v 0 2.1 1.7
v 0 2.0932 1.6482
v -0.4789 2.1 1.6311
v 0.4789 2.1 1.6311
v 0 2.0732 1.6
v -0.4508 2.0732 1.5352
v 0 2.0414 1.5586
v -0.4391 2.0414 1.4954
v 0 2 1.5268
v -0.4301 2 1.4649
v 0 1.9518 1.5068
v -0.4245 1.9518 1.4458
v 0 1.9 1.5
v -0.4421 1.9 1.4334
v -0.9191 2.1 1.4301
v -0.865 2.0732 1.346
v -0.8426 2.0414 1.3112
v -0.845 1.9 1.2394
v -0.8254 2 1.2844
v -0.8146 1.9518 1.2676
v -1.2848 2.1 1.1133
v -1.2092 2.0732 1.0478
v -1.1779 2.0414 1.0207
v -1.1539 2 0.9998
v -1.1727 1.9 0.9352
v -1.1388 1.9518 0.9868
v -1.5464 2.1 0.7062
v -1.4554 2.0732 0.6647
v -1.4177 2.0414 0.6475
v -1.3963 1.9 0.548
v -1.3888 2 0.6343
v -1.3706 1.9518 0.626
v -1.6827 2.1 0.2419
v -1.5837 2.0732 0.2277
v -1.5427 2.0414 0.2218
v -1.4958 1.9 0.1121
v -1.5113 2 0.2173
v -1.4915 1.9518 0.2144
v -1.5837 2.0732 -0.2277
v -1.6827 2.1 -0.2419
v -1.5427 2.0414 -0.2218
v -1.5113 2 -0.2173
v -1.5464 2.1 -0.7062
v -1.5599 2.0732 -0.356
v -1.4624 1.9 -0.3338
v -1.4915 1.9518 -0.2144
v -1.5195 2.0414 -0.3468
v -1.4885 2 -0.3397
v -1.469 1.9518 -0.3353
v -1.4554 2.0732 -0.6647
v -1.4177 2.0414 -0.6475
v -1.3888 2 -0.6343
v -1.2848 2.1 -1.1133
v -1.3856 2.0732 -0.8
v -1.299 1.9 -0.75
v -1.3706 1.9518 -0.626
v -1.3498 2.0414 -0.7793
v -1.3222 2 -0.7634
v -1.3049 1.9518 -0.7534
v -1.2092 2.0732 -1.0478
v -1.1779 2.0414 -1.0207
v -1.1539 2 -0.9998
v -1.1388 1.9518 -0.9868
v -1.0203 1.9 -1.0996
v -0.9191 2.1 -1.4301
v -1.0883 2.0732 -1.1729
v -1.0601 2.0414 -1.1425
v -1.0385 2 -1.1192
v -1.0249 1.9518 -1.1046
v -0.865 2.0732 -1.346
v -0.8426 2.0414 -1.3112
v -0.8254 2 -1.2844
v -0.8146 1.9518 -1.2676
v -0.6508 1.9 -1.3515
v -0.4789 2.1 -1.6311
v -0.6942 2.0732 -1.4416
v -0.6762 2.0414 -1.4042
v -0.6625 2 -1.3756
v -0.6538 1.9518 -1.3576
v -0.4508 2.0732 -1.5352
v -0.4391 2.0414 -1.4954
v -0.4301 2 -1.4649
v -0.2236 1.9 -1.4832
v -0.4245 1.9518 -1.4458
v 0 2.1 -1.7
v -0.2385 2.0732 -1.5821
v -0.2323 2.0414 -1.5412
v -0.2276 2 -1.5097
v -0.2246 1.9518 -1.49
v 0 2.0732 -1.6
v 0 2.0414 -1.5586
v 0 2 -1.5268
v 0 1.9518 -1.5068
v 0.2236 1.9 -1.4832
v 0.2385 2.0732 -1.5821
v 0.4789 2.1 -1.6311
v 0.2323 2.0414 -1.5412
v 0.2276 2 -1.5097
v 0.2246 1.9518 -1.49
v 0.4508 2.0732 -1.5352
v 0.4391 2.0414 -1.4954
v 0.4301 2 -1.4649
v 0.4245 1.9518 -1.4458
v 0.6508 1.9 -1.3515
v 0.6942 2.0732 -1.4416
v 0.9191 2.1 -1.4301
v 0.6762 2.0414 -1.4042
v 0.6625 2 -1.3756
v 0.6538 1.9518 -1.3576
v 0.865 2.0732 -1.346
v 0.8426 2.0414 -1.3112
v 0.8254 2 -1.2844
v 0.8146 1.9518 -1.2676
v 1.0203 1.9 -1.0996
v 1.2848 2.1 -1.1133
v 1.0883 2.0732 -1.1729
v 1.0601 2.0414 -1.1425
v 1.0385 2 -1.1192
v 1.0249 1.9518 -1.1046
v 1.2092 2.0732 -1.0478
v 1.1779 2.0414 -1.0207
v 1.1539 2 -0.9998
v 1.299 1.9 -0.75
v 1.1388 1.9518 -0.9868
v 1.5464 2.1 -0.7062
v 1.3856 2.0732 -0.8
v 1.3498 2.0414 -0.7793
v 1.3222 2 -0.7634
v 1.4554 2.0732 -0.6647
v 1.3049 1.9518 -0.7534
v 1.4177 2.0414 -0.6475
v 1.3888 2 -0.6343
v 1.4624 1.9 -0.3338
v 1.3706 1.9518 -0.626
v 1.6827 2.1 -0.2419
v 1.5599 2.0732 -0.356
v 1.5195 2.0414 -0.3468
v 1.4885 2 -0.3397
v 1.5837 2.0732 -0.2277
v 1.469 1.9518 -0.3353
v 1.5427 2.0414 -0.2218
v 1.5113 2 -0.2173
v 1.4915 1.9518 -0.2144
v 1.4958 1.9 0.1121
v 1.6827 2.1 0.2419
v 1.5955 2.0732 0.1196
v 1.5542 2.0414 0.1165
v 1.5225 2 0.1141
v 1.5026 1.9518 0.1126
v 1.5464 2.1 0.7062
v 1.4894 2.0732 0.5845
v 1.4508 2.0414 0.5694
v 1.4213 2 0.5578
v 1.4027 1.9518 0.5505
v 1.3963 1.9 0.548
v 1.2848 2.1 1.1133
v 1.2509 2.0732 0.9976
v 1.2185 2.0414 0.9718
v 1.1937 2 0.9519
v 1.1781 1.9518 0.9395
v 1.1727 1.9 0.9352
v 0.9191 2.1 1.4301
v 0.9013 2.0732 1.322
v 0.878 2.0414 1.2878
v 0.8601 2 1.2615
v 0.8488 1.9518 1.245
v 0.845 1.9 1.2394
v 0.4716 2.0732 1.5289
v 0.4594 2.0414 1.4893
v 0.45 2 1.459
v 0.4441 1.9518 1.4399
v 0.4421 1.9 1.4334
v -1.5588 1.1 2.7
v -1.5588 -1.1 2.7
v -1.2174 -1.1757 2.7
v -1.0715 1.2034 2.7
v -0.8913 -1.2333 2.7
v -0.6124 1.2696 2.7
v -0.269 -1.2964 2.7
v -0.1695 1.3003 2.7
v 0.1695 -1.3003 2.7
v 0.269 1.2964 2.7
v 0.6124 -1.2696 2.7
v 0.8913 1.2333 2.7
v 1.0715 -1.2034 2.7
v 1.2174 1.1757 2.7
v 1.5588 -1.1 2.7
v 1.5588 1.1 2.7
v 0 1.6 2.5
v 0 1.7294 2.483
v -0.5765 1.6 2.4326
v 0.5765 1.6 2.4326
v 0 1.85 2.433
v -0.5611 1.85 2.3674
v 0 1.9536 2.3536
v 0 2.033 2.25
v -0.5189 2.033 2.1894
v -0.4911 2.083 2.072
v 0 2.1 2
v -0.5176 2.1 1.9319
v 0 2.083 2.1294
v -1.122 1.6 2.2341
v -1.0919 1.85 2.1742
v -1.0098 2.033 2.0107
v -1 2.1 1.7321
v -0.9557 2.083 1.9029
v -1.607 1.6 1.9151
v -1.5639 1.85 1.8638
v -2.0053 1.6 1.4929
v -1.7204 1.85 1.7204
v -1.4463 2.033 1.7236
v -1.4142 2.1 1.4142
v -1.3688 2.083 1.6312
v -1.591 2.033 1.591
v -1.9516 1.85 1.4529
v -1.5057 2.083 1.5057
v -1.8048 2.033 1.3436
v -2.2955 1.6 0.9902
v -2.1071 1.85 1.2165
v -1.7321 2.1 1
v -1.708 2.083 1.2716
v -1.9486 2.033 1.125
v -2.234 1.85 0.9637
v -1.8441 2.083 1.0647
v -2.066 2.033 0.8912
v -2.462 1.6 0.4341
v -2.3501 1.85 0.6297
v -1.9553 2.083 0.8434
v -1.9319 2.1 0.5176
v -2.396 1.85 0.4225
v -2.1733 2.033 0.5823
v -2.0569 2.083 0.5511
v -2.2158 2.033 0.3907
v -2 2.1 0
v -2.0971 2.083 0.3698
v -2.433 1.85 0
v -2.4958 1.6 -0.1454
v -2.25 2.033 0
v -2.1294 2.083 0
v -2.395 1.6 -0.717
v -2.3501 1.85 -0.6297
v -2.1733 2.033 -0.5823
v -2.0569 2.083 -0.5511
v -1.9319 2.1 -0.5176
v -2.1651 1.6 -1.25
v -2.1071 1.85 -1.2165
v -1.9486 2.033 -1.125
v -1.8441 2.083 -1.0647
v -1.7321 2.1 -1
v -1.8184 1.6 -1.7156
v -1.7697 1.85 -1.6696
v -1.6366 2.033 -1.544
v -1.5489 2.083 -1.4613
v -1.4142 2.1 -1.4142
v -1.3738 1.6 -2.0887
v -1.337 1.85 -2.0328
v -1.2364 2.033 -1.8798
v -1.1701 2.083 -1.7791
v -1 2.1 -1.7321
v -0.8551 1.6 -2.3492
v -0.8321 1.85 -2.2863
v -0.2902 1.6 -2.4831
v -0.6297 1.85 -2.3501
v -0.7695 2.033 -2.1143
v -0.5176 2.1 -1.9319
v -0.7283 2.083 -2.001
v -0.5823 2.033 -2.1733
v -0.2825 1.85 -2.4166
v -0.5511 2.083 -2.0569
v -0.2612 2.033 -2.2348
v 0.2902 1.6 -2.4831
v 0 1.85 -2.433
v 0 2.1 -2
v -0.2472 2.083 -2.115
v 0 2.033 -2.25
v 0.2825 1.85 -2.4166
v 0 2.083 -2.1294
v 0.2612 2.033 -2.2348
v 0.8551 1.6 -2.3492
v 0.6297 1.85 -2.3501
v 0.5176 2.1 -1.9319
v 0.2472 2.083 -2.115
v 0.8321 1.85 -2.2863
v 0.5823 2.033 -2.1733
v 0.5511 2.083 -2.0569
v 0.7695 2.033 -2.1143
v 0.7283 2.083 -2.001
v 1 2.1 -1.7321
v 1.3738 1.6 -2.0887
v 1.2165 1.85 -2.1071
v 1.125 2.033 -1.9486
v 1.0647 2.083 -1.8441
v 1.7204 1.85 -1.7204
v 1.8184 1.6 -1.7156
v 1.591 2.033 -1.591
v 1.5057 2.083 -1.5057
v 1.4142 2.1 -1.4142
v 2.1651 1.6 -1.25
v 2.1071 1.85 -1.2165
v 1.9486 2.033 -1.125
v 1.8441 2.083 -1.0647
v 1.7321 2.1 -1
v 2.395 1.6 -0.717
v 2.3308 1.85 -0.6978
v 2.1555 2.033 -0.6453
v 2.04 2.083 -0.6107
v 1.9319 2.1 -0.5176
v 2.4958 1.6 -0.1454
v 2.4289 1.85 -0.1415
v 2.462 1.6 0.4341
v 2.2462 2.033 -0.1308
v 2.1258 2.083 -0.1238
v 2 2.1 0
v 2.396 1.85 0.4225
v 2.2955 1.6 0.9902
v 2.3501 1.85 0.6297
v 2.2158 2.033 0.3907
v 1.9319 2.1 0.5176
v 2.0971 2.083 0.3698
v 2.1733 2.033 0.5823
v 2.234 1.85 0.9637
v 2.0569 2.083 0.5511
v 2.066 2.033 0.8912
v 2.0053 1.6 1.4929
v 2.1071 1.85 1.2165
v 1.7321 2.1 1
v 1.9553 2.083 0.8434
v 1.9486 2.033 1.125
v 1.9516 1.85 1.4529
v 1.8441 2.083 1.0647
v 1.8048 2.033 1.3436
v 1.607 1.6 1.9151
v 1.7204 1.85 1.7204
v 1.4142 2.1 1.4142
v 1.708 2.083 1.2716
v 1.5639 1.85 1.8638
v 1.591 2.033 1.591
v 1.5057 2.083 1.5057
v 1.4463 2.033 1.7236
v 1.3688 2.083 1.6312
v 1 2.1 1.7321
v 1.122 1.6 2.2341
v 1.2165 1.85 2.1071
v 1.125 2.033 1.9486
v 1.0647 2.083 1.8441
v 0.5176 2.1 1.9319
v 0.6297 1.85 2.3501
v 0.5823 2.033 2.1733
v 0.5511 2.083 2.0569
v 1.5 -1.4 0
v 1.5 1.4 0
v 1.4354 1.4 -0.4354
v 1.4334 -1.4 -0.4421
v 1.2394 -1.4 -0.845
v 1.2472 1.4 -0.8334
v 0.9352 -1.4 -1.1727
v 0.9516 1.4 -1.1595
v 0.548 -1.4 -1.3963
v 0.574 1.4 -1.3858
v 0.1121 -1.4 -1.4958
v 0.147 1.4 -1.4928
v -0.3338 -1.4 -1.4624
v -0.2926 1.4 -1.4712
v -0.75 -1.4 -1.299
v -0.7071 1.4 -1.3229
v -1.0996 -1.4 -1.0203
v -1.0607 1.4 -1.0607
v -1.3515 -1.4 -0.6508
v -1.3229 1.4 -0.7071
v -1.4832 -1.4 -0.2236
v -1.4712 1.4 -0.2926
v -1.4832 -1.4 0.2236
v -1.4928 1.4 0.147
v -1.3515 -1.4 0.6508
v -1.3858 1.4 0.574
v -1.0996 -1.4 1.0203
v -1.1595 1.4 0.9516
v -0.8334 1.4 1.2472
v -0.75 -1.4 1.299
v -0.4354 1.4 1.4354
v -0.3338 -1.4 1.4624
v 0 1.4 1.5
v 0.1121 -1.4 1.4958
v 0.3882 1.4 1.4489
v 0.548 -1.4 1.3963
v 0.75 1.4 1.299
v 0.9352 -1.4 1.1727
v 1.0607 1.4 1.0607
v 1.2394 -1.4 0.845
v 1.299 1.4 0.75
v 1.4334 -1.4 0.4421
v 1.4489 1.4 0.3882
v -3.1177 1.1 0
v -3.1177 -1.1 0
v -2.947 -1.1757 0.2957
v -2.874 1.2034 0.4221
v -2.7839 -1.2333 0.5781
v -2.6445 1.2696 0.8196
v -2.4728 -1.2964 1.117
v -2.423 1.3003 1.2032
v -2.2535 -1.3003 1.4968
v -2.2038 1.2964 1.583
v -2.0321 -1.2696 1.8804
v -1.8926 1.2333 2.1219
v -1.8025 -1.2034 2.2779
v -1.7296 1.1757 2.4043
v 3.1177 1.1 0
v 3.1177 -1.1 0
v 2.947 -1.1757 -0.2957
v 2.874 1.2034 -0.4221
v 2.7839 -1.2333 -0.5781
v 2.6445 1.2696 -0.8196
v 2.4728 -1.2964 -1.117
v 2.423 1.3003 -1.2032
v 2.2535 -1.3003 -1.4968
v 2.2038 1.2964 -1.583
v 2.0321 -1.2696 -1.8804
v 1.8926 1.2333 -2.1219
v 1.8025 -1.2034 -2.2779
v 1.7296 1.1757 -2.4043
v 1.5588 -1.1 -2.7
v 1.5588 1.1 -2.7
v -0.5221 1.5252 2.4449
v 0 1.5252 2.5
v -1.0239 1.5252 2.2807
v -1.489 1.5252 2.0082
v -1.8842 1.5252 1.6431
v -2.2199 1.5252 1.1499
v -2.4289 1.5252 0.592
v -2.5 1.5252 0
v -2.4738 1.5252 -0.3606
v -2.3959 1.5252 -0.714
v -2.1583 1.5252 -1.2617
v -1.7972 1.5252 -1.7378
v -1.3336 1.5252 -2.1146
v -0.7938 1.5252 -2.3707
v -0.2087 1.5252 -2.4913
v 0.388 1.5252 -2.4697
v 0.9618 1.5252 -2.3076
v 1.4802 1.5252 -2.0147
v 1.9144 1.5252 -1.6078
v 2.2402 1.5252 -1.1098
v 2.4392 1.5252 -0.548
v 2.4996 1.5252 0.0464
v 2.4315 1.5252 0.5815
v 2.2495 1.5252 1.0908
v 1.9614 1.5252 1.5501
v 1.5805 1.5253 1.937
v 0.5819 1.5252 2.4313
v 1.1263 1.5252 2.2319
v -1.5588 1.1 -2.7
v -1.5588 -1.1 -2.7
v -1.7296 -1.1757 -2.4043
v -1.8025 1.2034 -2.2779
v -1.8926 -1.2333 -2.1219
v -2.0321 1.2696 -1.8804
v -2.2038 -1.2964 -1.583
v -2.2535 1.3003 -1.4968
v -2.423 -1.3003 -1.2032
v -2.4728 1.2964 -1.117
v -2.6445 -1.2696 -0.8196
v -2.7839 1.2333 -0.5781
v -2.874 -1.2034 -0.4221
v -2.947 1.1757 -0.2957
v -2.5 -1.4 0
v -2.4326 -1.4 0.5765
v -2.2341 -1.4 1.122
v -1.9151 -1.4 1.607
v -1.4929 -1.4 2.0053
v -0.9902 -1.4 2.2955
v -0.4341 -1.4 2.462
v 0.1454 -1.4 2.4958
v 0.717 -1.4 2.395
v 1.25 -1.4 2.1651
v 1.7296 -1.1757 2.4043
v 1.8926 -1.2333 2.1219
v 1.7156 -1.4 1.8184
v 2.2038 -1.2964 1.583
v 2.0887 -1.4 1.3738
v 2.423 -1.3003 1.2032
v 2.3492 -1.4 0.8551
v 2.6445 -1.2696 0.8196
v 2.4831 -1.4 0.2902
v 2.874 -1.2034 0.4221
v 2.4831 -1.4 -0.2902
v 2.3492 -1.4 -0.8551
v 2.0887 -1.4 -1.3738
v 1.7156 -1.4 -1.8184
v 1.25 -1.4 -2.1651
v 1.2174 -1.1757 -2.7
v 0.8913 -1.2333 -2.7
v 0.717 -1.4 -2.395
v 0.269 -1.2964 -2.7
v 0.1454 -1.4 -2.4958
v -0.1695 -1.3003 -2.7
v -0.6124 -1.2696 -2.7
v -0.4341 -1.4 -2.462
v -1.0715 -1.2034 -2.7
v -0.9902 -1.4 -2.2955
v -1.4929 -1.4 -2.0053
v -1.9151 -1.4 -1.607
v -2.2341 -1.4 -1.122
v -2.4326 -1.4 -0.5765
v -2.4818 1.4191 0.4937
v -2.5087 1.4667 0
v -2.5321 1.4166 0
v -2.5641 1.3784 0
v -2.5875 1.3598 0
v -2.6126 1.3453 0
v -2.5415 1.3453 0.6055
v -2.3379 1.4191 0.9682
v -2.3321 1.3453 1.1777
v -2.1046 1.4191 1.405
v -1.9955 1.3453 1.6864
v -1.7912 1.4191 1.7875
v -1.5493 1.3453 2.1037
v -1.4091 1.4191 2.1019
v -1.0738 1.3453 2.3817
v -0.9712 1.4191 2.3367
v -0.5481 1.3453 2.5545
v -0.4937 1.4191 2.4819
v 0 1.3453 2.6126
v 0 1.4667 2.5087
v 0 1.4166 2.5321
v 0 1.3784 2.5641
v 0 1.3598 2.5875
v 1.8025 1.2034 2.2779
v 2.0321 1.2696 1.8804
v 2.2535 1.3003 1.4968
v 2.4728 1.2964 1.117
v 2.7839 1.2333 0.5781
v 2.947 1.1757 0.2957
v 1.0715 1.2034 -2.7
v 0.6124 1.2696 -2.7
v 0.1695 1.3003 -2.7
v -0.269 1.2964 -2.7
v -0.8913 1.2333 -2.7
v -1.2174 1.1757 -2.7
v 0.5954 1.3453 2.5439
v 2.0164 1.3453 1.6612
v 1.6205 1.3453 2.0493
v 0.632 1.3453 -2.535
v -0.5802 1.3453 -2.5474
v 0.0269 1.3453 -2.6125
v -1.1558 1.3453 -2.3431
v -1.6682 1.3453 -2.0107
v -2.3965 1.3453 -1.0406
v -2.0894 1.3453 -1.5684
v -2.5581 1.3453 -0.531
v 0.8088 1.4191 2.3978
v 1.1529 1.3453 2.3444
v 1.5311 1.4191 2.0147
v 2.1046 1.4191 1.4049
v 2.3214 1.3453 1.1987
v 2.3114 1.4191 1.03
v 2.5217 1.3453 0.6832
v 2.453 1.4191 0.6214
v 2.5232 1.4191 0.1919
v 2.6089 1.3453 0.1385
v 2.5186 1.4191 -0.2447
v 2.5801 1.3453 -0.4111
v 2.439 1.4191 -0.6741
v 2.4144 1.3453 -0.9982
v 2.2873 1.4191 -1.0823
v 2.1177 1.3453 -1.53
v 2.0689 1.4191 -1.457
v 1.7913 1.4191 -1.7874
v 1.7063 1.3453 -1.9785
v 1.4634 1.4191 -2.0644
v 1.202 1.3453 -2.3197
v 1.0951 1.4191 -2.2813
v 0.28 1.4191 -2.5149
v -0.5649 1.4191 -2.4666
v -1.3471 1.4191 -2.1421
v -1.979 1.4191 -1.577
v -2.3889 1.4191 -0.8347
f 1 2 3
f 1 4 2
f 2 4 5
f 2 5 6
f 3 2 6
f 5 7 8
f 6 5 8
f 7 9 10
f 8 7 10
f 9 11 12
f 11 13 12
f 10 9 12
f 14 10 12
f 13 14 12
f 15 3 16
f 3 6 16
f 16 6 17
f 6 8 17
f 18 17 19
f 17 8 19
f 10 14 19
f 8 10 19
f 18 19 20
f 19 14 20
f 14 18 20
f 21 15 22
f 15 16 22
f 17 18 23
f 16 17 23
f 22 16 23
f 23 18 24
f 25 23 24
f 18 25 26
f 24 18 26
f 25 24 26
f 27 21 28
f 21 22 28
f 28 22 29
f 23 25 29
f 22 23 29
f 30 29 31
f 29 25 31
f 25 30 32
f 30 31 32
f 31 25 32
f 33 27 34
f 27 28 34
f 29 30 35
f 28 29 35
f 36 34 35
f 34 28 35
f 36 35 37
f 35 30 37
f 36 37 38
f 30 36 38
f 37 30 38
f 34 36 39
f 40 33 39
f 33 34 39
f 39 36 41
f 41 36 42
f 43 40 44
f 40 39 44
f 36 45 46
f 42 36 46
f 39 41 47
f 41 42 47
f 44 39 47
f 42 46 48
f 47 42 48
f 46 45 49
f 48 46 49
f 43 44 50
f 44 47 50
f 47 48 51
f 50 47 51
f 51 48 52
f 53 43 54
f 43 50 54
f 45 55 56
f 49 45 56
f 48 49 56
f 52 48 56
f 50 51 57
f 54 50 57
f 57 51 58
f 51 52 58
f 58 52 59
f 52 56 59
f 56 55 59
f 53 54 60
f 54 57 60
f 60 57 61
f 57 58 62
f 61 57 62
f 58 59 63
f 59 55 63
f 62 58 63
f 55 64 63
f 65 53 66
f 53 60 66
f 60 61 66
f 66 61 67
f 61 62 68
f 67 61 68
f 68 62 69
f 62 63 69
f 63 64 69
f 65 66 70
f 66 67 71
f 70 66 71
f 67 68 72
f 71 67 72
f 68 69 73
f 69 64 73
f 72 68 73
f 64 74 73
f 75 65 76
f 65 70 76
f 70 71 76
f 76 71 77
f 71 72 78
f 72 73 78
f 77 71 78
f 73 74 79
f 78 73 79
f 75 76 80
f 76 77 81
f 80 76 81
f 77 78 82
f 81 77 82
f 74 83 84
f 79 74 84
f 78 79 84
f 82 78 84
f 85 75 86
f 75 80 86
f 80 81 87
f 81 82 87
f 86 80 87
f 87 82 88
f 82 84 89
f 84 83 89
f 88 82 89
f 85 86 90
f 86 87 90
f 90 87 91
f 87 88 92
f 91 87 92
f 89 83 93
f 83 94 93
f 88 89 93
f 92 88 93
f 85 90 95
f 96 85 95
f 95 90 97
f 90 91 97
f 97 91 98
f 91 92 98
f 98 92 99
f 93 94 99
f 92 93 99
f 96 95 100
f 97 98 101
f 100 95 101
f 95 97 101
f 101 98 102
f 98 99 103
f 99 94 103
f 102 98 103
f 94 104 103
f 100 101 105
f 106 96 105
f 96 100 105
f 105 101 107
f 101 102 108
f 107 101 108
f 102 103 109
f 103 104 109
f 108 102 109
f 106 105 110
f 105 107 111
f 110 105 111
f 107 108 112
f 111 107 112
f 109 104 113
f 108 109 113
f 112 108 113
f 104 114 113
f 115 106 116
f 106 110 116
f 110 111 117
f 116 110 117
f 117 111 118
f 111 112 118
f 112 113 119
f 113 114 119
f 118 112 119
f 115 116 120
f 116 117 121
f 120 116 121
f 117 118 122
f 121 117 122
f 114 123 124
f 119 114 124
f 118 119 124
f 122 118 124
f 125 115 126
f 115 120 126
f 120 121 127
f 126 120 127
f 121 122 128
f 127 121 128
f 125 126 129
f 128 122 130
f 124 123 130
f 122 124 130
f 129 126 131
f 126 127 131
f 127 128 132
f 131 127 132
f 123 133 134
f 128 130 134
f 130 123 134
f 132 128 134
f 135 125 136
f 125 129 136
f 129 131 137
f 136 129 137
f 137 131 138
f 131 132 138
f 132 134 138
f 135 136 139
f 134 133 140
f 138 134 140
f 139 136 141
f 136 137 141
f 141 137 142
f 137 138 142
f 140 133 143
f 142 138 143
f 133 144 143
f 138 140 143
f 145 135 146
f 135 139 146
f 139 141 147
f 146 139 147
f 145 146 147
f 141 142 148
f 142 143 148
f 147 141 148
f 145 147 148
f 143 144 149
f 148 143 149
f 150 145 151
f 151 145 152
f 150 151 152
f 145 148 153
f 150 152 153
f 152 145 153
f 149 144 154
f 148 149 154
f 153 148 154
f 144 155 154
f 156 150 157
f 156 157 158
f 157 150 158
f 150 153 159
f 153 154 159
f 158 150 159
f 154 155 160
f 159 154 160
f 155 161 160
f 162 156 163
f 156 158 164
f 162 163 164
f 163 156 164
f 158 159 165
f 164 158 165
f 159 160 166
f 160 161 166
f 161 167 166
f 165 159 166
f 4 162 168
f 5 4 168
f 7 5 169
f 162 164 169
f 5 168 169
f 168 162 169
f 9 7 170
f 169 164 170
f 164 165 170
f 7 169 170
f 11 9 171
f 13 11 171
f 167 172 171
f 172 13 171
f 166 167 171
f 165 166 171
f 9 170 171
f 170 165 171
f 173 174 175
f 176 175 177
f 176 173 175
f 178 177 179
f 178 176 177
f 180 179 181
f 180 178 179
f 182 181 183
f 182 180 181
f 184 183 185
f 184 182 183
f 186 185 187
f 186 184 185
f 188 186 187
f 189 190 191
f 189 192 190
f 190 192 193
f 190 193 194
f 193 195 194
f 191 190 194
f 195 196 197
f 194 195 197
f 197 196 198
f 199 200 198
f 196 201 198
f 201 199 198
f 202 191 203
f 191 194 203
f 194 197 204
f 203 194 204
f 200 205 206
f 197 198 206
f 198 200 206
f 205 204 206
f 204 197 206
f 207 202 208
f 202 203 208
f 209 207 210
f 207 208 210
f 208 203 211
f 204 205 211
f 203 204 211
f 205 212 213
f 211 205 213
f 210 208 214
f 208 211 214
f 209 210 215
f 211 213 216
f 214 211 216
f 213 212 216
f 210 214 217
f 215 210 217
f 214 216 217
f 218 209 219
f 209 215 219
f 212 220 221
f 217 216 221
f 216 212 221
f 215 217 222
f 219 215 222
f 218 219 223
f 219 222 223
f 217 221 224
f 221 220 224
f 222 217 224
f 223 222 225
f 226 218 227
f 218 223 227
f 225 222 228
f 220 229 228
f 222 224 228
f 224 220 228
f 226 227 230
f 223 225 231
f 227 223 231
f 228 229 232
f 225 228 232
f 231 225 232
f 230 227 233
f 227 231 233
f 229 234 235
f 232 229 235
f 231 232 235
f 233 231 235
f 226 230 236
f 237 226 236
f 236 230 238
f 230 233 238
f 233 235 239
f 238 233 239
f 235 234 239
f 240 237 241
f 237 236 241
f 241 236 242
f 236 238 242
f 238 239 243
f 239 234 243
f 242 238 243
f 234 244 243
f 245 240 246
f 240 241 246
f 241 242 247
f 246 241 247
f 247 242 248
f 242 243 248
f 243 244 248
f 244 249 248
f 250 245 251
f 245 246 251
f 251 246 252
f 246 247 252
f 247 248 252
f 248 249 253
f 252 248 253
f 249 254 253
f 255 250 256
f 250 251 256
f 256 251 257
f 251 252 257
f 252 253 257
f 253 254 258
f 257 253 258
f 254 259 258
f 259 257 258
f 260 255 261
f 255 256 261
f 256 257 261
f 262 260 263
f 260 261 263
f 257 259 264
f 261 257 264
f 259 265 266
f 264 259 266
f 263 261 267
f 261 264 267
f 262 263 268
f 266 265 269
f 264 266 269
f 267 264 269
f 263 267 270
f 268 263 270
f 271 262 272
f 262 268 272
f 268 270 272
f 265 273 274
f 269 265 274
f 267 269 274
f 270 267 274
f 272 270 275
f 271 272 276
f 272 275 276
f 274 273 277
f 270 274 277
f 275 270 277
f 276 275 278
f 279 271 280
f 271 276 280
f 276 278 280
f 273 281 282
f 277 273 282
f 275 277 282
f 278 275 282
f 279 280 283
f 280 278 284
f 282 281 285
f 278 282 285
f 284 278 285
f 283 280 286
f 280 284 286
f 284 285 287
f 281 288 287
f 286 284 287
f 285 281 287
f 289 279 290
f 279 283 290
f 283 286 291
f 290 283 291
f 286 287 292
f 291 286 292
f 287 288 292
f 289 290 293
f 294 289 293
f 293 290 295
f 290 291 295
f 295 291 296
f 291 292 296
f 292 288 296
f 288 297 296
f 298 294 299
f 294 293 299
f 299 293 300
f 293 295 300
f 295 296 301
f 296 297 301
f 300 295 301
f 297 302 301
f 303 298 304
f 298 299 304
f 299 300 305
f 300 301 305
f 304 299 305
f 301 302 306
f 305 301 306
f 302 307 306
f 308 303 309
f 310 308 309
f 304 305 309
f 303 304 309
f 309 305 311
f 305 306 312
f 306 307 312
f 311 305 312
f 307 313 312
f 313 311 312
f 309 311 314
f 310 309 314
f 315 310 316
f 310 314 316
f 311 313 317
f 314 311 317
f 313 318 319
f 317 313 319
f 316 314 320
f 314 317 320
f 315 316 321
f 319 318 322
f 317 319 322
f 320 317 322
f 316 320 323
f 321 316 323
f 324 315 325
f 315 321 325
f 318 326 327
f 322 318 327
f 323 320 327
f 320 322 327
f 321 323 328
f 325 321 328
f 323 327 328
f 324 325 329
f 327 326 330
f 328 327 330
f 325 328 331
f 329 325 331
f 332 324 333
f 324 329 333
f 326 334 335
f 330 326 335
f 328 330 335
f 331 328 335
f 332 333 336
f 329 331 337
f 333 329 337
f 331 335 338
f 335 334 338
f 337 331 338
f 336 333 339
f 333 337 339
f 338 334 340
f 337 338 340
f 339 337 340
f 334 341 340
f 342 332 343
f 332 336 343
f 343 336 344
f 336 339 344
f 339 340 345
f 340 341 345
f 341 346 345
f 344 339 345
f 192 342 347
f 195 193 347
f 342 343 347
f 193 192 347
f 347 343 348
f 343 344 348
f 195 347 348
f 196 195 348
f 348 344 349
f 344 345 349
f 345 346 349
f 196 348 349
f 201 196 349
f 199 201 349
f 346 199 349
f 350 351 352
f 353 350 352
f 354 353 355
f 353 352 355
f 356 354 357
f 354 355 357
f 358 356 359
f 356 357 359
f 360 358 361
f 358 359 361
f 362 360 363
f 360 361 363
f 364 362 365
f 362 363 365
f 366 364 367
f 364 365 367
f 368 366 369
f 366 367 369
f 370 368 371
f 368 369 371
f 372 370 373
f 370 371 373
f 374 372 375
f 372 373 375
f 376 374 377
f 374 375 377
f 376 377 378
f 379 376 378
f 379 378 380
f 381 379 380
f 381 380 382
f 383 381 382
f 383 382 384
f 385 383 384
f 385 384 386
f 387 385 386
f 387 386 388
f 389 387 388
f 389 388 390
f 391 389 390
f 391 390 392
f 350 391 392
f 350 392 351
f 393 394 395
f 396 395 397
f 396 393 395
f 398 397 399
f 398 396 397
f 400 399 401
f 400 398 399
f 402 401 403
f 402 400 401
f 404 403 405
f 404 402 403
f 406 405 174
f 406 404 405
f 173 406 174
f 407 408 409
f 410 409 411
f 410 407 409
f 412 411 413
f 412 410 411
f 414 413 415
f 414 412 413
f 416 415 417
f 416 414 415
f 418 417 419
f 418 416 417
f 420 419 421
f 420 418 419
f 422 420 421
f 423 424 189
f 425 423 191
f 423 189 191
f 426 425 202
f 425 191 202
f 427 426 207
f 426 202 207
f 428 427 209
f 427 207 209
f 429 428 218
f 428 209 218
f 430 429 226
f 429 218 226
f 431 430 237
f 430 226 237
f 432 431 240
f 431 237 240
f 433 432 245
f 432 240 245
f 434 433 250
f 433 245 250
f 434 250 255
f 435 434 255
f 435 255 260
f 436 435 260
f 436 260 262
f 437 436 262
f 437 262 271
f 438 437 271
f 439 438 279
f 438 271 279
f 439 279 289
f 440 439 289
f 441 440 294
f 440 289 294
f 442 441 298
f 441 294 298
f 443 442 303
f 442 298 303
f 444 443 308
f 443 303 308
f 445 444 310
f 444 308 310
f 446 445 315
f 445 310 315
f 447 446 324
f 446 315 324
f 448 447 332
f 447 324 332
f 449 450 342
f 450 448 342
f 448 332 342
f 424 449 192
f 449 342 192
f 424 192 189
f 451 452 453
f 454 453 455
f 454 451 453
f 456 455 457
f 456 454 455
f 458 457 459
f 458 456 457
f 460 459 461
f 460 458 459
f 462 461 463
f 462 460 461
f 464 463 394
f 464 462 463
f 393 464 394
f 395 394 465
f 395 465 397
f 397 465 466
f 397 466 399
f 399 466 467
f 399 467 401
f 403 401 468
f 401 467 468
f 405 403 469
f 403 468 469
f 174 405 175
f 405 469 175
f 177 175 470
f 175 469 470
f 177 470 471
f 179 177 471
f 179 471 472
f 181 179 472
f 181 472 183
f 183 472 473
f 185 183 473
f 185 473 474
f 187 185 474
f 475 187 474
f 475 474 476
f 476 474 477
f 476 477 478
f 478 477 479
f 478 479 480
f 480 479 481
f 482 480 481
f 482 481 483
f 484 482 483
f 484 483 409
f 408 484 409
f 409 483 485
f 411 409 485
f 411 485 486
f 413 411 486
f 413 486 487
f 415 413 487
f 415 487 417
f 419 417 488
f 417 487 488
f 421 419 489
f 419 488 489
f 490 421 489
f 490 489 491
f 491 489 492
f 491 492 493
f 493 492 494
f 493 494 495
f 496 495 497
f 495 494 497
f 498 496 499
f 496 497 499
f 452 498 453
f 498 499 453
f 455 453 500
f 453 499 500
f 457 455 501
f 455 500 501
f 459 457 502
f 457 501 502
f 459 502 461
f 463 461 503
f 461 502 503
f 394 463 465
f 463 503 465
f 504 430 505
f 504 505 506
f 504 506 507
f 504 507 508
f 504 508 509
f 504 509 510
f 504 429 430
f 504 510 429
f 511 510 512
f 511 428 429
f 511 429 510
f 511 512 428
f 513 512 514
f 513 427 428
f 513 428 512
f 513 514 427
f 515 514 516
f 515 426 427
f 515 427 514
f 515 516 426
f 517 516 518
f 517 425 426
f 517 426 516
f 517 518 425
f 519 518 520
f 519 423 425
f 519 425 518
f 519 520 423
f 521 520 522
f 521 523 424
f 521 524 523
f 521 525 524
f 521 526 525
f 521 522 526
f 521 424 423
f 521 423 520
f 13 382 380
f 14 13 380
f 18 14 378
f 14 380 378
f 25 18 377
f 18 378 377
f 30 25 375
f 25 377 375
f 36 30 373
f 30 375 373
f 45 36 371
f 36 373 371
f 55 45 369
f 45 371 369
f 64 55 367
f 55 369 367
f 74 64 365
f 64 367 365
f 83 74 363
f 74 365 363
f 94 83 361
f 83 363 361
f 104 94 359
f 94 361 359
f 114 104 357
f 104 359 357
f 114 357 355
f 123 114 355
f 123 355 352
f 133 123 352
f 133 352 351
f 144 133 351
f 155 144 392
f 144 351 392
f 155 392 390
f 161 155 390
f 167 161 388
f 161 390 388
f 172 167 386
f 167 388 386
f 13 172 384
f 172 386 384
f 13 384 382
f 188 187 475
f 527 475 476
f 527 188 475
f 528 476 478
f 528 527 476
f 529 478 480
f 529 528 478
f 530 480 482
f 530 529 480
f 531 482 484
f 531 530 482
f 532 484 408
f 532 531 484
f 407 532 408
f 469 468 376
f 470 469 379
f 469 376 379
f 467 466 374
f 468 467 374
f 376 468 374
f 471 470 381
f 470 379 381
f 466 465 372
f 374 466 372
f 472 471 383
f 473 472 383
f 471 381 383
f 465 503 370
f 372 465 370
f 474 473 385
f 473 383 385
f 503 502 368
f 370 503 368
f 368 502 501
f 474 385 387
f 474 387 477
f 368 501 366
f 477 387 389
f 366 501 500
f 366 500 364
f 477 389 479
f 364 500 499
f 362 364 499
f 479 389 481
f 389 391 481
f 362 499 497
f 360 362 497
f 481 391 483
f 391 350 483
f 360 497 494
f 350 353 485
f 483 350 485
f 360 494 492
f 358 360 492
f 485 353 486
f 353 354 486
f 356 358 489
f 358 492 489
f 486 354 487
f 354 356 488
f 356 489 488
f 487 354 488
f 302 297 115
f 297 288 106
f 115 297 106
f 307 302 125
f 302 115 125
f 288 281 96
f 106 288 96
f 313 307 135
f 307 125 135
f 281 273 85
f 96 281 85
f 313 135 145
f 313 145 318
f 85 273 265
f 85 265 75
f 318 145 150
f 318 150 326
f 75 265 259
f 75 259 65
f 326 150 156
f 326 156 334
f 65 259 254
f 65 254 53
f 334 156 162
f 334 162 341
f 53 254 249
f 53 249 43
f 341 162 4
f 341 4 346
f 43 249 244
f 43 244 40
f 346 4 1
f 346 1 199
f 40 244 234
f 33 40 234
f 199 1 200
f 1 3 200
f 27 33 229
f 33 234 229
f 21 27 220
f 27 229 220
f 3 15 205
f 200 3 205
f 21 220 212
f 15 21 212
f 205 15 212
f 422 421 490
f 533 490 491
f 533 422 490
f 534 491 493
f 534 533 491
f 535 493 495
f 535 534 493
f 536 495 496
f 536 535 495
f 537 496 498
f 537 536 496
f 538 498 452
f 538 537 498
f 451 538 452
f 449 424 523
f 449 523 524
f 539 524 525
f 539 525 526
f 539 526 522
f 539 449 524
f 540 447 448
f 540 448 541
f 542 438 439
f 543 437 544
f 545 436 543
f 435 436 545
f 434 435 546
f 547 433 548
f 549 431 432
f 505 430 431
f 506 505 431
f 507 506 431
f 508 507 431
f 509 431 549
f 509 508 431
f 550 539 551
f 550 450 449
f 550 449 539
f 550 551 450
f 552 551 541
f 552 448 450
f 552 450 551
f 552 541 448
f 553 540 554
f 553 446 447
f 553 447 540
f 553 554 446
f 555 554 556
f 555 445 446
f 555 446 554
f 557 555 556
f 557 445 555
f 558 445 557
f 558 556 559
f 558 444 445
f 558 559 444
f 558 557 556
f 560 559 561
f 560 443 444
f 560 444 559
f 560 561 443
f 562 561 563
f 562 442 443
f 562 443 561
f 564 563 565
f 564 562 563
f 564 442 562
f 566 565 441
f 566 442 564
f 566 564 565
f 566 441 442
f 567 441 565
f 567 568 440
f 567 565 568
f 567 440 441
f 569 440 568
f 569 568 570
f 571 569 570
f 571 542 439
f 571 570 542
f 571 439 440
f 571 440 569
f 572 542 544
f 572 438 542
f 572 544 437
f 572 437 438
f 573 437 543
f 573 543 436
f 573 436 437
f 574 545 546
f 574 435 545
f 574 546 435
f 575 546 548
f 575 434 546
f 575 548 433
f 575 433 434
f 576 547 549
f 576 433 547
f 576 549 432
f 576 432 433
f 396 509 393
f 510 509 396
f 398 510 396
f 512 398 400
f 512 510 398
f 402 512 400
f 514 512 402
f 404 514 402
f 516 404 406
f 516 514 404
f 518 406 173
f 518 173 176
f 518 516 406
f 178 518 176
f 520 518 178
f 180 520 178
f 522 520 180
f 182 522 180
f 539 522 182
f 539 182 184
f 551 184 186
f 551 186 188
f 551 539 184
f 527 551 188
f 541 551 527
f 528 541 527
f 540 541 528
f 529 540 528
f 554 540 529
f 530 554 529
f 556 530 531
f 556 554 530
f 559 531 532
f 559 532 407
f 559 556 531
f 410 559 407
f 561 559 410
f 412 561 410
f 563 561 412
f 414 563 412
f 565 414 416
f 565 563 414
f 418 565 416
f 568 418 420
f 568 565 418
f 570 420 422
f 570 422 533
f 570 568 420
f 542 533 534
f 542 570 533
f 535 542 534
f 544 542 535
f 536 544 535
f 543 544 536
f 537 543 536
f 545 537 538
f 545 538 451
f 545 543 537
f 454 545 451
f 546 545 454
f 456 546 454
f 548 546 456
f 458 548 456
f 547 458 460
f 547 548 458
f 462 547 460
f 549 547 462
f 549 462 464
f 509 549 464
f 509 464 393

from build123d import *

# Parameters (mm, degrees)
EXTRUDE_1_DEPTH     = 1.4
SKETCH_3_R          = 1.5
CUT_EXTRUDE_1_DEPTH = 3.8
FILLET_1_R          = 0.2


with BuildPart() as part:
    # 草图1 → 凸台-拉伸1 (new body, symmetric)
    with BuildSketch(Plane(origin=(0, 0, 0), x_dir=(1, 0, 0), z_dir=(0, 1, 0))):
        Polygon((3.117691454, 0), (1.558845727, 2.7), (-1.558845727, 2.7), (-3.117691454, 0), (-1.558845727, -2.7), (1.558845727, -2.7), align=None)
    extrude(amount=EXTRUDE_1_DEPTH, both=True)

    # 草图2 → 切除-旋转1 (revolve, cut)
    with BuildSketch(Plane.XY):
        Polygon((-3.117691454, 1.1), (-2.5, 1.4), (-3.117691454, 1.4), align=None)
    cut_revolve_1 = revolve(axis=Axis((0, 0, 0), (0, 1, 0)), mode=Mode.SUBTRACT)

    # 镜向3: 切除-旋转1 across plane
    add(cut_revolve_1.mirror(Plane.ZX), mode=Mode.SUBTRACT)

    # 草图3 → 切除-拉伸1 (cut, through all)
    with BuildSketch(Plane(origin=(0, 1.4, 0), x_dir=(1, 0, 0), z_dir=(0, 1, 0))):
        Circle(SKETCH_3_R)
    extrude(amount=-CUT_EXTRUDE_1_DEPTH, mode=Mode.SUBTRACT)

    # 草图4 → 旋转1 (revolve)
    with BuildSketch(Plane(origin=(0, 0, 0), x_dir=(0, 0, -1), z_dir=(1, 0, 0))):
        with BuildLine():
            Line((-2.5, 1.4), (-2.5, 1.6))
            ThreePointArc((-2.5, 1.6), (-2.353553391, 1.953553391), (-2, 2.1))
            Line((-2, 2.1), (-1.5, 2.1))
            Line((-1.5, 2.1), (-1.5, 1.4))
            Line((-1.5, 1.4), (-2.5, 1.4))
        make_face()
    revolve(axis=Axis((0, 1.4, 0), (0, -1, 0)))

    # 圆角1
    fillet_1_edges = [part.edges().sort_by_distance(p)[0] for p in [
        (-1.767766953, 1.4, 1.767766953),
        (0, 2.1, -1.5),
    ]]
    fillet(fillet_1_edges, radius=FILLET_1_R)


solid = part.part
